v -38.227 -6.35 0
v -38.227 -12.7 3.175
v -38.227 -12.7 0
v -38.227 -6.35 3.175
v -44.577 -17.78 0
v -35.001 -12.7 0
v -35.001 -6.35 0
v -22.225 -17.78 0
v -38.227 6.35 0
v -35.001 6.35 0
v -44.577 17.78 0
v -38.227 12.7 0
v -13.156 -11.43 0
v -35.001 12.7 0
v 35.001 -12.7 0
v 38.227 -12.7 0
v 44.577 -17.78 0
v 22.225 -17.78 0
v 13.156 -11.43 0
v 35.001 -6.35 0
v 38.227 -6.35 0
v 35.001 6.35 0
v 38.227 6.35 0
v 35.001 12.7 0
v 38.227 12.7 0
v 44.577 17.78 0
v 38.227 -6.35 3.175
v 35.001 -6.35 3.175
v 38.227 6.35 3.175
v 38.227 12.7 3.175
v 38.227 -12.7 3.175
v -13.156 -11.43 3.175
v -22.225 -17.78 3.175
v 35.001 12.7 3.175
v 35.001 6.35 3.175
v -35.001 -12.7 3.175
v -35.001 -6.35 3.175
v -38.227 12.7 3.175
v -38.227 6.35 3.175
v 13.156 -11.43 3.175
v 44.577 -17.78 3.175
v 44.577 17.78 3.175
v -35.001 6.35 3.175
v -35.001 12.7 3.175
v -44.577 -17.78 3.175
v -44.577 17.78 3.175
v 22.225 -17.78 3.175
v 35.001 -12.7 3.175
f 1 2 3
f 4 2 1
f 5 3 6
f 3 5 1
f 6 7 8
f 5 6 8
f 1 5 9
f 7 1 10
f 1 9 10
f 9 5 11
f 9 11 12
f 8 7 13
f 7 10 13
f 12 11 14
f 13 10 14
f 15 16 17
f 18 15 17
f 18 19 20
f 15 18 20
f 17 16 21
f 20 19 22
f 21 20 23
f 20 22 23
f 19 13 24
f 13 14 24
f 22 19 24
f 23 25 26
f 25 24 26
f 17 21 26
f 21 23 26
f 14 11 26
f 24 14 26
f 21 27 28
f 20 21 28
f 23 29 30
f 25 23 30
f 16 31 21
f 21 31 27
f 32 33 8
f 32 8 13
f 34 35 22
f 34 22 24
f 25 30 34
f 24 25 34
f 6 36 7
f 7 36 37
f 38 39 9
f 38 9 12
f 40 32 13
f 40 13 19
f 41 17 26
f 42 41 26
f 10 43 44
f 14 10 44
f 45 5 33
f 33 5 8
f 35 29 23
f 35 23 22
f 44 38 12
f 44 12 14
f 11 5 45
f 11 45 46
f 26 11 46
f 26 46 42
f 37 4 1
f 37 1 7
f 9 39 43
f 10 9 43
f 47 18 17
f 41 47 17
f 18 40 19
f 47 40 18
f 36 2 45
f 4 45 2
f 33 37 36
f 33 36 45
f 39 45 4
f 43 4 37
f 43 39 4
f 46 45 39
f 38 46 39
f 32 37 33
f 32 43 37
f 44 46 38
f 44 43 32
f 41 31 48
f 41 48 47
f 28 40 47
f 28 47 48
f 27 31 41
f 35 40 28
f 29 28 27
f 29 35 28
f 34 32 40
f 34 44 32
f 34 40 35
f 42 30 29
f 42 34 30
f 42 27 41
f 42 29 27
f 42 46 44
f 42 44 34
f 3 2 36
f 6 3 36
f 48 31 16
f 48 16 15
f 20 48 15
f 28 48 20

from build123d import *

# Parameters (mm, degrees)
SKETCH1_W           = 89.154
SKETCH1_H           = 35.56
BOSS_EXTRUDE1_DEPTH = 3.175
SKETCH2_W           = 3.2258
SKETCH2_H           = 6.35
CUT_EXTRUDE1_DEPTH  = 4.175
CUT_EXTRUDE2_DEPTH  = 4.175


with BuildPart() as part:
    # Sketch1 → Boss-Extrude1 (new body)
    with BuildSketch(Plane.XY):
        Rectangle(SKETCH1_W, SKETCH1_H)
    extrude(amount=BOSS_EXTRUDE1_DEPTH)

    # Sketch2 → Cut-Extrude1 (cut, through all)
    with BuildSketch(Plane.XY.offset(3.175)):
        with Locations((-36.6141, 9.525)):
            Rectangle(SKETCH2_W, SKETCH2_H)
        with Locations((-36.6141, -9.525)):
            Rectangle(SKETCH2_W, SKETCH2_H)
    cut_extrude1 = extrude(amount=-CUT_EXTRUDE1_DEPTH, mode=Mode.SUBTRACT)

    # Mirror1: Cut-Extrude1 across plane
    add(cut_extrude1.mirror(Plane(origin=(0, 0, 0), x_dir=(0, 0, 1), z_dir=(1, 0, 0))), mode=Mode.SUBTRACT)

    # Sketch3 → Cut-Extrude2 (cut, through all)
    with BuildSketch(Plane.XY.offset(3.175)):
        Polygon((-13.156260157, -11.43), (13.156260157, -11.43), (22.225, -17.78), (-22.225, -17.78), align=None)
    extrude(amount=-CUT_EXTRUDE2_DEPTH, mode=Mode.SUBTRACT)


solid = part.part
